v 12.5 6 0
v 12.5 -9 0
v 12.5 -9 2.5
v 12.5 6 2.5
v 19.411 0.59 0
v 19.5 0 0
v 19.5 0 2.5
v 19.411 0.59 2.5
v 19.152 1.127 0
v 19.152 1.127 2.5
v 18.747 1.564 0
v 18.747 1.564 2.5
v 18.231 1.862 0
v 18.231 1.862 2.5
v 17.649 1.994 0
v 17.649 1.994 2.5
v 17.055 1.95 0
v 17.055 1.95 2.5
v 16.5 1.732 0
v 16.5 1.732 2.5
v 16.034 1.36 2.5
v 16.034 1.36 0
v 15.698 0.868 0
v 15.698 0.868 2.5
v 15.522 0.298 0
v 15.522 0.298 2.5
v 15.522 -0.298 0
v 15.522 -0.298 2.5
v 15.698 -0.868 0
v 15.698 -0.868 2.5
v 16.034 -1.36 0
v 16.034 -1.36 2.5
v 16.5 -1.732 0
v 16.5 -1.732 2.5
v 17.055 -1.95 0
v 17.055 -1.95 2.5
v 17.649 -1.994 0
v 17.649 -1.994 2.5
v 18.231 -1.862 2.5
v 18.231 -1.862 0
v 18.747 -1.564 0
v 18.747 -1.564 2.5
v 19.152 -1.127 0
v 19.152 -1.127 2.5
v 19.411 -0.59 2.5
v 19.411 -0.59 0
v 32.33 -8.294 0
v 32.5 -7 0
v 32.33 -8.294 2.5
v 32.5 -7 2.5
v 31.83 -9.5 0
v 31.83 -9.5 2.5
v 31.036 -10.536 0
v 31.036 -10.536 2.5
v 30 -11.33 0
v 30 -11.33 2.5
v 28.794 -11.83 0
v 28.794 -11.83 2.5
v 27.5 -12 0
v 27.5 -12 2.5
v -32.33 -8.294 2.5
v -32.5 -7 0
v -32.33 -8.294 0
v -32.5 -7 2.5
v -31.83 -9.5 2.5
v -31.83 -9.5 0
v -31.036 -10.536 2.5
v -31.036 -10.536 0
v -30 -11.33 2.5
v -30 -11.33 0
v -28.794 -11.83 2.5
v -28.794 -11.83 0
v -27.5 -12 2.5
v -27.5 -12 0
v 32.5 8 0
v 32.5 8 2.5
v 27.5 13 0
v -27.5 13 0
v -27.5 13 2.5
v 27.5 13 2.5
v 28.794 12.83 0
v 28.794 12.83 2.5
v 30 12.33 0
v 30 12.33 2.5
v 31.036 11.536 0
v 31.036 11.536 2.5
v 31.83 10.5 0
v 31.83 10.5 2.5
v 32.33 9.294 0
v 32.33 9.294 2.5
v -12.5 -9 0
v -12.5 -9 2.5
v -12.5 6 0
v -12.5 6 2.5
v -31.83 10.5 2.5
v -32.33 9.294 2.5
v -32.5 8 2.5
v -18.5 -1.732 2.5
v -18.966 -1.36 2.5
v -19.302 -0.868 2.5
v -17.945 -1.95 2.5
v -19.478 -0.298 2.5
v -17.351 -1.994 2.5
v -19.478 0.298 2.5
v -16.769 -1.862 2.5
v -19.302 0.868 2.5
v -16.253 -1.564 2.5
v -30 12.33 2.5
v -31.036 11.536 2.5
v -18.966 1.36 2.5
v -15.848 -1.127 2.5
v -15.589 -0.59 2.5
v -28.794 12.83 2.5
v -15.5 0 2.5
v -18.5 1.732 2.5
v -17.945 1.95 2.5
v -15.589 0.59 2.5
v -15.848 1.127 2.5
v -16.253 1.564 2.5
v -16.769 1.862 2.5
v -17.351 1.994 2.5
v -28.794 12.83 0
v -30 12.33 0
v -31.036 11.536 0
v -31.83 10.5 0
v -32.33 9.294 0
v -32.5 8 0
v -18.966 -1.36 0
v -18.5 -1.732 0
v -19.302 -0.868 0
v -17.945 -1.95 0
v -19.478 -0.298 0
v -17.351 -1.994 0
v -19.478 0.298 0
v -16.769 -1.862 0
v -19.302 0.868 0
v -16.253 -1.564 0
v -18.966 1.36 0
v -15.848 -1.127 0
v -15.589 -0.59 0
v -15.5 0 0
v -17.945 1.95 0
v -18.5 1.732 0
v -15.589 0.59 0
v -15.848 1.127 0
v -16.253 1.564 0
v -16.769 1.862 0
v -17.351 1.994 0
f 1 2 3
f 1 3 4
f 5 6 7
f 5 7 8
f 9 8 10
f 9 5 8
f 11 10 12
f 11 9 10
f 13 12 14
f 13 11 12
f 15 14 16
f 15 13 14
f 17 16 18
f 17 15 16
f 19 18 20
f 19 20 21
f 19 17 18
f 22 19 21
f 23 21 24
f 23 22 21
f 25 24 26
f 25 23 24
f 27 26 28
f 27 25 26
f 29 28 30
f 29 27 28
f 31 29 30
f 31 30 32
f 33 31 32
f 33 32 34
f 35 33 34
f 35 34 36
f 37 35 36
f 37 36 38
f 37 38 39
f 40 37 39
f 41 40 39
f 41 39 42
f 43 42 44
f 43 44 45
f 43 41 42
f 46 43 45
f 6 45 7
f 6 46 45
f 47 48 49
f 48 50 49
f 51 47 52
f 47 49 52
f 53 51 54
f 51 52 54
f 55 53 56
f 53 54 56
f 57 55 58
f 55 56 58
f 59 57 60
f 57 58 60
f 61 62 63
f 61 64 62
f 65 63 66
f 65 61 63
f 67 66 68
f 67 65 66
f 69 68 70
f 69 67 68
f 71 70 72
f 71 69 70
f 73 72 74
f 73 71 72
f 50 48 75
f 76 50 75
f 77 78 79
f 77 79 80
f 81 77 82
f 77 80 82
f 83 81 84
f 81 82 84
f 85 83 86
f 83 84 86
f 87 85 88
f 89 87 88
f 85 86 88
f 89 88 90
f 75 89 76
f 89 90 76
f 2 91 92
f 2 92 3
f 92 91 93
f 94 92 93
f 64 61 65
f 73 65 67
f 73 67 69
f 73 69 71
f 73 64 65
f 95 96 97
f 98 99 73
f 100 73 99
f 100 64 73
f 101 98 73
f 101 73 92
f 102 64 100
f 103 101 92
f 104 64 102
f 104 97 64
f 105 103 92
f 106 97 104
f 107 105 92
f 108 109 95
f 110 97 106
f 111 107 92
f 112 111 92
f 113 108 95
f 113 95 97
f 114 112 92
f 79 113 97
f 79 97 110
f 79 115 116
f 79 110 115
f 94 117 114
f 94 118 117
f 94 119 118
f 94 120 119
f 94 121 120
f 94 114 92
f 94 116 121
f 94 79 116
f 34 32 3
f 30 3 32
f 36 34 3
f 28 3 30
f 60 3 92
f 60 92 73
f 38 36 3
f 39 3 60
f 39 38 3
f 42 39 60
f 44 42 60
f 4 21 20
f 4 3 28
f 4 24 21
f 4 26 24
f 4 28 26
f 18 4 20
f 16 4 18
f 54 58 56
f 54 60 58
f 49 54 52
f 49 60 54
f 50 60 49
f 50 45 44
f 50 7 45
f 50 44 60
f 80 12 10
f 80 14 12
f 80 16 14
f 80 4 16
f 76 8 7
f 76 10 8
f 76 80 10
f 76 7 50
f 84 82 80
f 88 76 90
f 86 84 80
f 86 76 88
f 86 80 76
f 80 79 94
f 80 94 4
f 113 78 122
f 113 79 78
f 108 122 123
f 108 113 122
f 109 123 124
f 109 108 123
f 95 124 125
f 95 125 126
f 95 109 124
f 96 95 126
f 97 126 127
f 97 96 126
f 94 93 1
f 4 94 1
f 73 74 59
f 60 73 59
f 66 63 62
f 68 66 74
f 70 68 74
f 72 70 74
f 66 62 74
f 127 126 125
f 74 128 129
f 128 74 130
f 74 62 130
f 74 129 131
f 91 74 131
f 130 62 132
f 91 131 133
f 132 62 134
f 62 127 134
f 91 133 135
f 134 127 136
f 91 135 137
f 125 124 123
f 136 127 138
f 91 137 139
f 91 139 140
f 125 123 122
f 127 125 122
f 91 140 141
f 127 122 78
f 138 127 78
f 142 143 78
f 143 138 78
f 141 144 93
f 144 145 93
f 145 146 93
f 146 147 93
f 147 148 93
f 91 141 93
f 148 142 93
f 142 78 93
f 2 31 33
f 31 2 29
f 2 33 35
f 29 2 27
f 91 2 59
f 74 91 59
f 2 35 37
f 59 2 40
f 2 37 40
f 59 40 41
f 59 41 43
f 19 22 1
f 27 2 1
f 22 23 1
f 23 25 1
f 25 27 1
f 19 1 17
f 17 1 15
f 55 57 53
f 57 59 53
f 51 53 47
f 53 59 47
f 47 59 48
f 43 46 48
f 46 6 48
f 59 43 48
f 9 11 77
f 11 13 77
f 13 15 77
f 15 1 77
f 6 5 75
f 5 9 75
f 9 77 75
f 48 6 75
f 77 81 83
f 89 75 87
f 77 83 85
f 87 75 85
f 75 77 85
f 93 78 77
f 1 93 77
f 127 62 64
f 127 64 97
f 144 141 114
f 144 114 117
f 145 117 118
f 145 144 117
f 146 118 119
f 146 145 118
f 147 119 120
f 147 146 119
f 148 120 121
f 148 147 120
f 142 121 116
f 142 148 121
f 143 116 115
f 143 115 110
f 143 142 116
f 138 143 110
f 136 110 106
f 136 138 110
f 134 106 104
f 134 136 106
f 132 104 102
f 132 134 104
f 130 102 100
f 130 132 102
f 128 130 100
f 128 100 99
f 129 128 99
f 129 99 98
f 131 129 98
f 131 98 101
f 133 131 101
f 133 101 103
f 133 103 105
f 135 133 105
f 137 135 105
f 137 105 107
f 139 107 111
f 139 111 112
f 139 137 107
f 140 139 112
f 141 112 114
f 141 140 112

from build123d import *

# Parameters (mm, degrees)
F0_W     = 65
F0_H     = 25
F0_R     = 2
F0_W_2   = 25
F0_H_2   = 15
F1_DEPTH = 2.5
F2_R     = 5
F3_R     = 5


with BuildPart() as f1:
    # F0 (on Top) → F1 (new body)
    with BuildSketch(Plane.XY):
        with Locations((0, 0.5)):
            Rectangle(F0_W, F0_H)
        with Locations((-17.5, 0)):
            Circle(F0_R, mode=Mode.SUBTRACT)
        with Locations((0, -1.5)):
            Rectangle(F0_W_2, F0_H_2, mode=Mode.SUBTRACT)
        with Locations((17.5, 0)):
            Circle(F0_R, mode=Mode.SUBTRACT)
    extrude(amount=F1_DEPTH)

    # F2
    f2_edges = [f1.edges().sort_by_distance(p)[0] for p in [
        (32.5, 13, 1.25),
    ]]
    fillet(f2_edges, radius=F2_R)

    # F3
    f3_edges = [f1.edges().sort_by_distance(p)[0] for p in [
        (32.5, -12, 1.25),
        (-32.5, -12, 1.25),
        (-32.5, 13, 1.25),
    ]]
    fillet(f3_edges, radius=F3_R)


solid = f1.part
